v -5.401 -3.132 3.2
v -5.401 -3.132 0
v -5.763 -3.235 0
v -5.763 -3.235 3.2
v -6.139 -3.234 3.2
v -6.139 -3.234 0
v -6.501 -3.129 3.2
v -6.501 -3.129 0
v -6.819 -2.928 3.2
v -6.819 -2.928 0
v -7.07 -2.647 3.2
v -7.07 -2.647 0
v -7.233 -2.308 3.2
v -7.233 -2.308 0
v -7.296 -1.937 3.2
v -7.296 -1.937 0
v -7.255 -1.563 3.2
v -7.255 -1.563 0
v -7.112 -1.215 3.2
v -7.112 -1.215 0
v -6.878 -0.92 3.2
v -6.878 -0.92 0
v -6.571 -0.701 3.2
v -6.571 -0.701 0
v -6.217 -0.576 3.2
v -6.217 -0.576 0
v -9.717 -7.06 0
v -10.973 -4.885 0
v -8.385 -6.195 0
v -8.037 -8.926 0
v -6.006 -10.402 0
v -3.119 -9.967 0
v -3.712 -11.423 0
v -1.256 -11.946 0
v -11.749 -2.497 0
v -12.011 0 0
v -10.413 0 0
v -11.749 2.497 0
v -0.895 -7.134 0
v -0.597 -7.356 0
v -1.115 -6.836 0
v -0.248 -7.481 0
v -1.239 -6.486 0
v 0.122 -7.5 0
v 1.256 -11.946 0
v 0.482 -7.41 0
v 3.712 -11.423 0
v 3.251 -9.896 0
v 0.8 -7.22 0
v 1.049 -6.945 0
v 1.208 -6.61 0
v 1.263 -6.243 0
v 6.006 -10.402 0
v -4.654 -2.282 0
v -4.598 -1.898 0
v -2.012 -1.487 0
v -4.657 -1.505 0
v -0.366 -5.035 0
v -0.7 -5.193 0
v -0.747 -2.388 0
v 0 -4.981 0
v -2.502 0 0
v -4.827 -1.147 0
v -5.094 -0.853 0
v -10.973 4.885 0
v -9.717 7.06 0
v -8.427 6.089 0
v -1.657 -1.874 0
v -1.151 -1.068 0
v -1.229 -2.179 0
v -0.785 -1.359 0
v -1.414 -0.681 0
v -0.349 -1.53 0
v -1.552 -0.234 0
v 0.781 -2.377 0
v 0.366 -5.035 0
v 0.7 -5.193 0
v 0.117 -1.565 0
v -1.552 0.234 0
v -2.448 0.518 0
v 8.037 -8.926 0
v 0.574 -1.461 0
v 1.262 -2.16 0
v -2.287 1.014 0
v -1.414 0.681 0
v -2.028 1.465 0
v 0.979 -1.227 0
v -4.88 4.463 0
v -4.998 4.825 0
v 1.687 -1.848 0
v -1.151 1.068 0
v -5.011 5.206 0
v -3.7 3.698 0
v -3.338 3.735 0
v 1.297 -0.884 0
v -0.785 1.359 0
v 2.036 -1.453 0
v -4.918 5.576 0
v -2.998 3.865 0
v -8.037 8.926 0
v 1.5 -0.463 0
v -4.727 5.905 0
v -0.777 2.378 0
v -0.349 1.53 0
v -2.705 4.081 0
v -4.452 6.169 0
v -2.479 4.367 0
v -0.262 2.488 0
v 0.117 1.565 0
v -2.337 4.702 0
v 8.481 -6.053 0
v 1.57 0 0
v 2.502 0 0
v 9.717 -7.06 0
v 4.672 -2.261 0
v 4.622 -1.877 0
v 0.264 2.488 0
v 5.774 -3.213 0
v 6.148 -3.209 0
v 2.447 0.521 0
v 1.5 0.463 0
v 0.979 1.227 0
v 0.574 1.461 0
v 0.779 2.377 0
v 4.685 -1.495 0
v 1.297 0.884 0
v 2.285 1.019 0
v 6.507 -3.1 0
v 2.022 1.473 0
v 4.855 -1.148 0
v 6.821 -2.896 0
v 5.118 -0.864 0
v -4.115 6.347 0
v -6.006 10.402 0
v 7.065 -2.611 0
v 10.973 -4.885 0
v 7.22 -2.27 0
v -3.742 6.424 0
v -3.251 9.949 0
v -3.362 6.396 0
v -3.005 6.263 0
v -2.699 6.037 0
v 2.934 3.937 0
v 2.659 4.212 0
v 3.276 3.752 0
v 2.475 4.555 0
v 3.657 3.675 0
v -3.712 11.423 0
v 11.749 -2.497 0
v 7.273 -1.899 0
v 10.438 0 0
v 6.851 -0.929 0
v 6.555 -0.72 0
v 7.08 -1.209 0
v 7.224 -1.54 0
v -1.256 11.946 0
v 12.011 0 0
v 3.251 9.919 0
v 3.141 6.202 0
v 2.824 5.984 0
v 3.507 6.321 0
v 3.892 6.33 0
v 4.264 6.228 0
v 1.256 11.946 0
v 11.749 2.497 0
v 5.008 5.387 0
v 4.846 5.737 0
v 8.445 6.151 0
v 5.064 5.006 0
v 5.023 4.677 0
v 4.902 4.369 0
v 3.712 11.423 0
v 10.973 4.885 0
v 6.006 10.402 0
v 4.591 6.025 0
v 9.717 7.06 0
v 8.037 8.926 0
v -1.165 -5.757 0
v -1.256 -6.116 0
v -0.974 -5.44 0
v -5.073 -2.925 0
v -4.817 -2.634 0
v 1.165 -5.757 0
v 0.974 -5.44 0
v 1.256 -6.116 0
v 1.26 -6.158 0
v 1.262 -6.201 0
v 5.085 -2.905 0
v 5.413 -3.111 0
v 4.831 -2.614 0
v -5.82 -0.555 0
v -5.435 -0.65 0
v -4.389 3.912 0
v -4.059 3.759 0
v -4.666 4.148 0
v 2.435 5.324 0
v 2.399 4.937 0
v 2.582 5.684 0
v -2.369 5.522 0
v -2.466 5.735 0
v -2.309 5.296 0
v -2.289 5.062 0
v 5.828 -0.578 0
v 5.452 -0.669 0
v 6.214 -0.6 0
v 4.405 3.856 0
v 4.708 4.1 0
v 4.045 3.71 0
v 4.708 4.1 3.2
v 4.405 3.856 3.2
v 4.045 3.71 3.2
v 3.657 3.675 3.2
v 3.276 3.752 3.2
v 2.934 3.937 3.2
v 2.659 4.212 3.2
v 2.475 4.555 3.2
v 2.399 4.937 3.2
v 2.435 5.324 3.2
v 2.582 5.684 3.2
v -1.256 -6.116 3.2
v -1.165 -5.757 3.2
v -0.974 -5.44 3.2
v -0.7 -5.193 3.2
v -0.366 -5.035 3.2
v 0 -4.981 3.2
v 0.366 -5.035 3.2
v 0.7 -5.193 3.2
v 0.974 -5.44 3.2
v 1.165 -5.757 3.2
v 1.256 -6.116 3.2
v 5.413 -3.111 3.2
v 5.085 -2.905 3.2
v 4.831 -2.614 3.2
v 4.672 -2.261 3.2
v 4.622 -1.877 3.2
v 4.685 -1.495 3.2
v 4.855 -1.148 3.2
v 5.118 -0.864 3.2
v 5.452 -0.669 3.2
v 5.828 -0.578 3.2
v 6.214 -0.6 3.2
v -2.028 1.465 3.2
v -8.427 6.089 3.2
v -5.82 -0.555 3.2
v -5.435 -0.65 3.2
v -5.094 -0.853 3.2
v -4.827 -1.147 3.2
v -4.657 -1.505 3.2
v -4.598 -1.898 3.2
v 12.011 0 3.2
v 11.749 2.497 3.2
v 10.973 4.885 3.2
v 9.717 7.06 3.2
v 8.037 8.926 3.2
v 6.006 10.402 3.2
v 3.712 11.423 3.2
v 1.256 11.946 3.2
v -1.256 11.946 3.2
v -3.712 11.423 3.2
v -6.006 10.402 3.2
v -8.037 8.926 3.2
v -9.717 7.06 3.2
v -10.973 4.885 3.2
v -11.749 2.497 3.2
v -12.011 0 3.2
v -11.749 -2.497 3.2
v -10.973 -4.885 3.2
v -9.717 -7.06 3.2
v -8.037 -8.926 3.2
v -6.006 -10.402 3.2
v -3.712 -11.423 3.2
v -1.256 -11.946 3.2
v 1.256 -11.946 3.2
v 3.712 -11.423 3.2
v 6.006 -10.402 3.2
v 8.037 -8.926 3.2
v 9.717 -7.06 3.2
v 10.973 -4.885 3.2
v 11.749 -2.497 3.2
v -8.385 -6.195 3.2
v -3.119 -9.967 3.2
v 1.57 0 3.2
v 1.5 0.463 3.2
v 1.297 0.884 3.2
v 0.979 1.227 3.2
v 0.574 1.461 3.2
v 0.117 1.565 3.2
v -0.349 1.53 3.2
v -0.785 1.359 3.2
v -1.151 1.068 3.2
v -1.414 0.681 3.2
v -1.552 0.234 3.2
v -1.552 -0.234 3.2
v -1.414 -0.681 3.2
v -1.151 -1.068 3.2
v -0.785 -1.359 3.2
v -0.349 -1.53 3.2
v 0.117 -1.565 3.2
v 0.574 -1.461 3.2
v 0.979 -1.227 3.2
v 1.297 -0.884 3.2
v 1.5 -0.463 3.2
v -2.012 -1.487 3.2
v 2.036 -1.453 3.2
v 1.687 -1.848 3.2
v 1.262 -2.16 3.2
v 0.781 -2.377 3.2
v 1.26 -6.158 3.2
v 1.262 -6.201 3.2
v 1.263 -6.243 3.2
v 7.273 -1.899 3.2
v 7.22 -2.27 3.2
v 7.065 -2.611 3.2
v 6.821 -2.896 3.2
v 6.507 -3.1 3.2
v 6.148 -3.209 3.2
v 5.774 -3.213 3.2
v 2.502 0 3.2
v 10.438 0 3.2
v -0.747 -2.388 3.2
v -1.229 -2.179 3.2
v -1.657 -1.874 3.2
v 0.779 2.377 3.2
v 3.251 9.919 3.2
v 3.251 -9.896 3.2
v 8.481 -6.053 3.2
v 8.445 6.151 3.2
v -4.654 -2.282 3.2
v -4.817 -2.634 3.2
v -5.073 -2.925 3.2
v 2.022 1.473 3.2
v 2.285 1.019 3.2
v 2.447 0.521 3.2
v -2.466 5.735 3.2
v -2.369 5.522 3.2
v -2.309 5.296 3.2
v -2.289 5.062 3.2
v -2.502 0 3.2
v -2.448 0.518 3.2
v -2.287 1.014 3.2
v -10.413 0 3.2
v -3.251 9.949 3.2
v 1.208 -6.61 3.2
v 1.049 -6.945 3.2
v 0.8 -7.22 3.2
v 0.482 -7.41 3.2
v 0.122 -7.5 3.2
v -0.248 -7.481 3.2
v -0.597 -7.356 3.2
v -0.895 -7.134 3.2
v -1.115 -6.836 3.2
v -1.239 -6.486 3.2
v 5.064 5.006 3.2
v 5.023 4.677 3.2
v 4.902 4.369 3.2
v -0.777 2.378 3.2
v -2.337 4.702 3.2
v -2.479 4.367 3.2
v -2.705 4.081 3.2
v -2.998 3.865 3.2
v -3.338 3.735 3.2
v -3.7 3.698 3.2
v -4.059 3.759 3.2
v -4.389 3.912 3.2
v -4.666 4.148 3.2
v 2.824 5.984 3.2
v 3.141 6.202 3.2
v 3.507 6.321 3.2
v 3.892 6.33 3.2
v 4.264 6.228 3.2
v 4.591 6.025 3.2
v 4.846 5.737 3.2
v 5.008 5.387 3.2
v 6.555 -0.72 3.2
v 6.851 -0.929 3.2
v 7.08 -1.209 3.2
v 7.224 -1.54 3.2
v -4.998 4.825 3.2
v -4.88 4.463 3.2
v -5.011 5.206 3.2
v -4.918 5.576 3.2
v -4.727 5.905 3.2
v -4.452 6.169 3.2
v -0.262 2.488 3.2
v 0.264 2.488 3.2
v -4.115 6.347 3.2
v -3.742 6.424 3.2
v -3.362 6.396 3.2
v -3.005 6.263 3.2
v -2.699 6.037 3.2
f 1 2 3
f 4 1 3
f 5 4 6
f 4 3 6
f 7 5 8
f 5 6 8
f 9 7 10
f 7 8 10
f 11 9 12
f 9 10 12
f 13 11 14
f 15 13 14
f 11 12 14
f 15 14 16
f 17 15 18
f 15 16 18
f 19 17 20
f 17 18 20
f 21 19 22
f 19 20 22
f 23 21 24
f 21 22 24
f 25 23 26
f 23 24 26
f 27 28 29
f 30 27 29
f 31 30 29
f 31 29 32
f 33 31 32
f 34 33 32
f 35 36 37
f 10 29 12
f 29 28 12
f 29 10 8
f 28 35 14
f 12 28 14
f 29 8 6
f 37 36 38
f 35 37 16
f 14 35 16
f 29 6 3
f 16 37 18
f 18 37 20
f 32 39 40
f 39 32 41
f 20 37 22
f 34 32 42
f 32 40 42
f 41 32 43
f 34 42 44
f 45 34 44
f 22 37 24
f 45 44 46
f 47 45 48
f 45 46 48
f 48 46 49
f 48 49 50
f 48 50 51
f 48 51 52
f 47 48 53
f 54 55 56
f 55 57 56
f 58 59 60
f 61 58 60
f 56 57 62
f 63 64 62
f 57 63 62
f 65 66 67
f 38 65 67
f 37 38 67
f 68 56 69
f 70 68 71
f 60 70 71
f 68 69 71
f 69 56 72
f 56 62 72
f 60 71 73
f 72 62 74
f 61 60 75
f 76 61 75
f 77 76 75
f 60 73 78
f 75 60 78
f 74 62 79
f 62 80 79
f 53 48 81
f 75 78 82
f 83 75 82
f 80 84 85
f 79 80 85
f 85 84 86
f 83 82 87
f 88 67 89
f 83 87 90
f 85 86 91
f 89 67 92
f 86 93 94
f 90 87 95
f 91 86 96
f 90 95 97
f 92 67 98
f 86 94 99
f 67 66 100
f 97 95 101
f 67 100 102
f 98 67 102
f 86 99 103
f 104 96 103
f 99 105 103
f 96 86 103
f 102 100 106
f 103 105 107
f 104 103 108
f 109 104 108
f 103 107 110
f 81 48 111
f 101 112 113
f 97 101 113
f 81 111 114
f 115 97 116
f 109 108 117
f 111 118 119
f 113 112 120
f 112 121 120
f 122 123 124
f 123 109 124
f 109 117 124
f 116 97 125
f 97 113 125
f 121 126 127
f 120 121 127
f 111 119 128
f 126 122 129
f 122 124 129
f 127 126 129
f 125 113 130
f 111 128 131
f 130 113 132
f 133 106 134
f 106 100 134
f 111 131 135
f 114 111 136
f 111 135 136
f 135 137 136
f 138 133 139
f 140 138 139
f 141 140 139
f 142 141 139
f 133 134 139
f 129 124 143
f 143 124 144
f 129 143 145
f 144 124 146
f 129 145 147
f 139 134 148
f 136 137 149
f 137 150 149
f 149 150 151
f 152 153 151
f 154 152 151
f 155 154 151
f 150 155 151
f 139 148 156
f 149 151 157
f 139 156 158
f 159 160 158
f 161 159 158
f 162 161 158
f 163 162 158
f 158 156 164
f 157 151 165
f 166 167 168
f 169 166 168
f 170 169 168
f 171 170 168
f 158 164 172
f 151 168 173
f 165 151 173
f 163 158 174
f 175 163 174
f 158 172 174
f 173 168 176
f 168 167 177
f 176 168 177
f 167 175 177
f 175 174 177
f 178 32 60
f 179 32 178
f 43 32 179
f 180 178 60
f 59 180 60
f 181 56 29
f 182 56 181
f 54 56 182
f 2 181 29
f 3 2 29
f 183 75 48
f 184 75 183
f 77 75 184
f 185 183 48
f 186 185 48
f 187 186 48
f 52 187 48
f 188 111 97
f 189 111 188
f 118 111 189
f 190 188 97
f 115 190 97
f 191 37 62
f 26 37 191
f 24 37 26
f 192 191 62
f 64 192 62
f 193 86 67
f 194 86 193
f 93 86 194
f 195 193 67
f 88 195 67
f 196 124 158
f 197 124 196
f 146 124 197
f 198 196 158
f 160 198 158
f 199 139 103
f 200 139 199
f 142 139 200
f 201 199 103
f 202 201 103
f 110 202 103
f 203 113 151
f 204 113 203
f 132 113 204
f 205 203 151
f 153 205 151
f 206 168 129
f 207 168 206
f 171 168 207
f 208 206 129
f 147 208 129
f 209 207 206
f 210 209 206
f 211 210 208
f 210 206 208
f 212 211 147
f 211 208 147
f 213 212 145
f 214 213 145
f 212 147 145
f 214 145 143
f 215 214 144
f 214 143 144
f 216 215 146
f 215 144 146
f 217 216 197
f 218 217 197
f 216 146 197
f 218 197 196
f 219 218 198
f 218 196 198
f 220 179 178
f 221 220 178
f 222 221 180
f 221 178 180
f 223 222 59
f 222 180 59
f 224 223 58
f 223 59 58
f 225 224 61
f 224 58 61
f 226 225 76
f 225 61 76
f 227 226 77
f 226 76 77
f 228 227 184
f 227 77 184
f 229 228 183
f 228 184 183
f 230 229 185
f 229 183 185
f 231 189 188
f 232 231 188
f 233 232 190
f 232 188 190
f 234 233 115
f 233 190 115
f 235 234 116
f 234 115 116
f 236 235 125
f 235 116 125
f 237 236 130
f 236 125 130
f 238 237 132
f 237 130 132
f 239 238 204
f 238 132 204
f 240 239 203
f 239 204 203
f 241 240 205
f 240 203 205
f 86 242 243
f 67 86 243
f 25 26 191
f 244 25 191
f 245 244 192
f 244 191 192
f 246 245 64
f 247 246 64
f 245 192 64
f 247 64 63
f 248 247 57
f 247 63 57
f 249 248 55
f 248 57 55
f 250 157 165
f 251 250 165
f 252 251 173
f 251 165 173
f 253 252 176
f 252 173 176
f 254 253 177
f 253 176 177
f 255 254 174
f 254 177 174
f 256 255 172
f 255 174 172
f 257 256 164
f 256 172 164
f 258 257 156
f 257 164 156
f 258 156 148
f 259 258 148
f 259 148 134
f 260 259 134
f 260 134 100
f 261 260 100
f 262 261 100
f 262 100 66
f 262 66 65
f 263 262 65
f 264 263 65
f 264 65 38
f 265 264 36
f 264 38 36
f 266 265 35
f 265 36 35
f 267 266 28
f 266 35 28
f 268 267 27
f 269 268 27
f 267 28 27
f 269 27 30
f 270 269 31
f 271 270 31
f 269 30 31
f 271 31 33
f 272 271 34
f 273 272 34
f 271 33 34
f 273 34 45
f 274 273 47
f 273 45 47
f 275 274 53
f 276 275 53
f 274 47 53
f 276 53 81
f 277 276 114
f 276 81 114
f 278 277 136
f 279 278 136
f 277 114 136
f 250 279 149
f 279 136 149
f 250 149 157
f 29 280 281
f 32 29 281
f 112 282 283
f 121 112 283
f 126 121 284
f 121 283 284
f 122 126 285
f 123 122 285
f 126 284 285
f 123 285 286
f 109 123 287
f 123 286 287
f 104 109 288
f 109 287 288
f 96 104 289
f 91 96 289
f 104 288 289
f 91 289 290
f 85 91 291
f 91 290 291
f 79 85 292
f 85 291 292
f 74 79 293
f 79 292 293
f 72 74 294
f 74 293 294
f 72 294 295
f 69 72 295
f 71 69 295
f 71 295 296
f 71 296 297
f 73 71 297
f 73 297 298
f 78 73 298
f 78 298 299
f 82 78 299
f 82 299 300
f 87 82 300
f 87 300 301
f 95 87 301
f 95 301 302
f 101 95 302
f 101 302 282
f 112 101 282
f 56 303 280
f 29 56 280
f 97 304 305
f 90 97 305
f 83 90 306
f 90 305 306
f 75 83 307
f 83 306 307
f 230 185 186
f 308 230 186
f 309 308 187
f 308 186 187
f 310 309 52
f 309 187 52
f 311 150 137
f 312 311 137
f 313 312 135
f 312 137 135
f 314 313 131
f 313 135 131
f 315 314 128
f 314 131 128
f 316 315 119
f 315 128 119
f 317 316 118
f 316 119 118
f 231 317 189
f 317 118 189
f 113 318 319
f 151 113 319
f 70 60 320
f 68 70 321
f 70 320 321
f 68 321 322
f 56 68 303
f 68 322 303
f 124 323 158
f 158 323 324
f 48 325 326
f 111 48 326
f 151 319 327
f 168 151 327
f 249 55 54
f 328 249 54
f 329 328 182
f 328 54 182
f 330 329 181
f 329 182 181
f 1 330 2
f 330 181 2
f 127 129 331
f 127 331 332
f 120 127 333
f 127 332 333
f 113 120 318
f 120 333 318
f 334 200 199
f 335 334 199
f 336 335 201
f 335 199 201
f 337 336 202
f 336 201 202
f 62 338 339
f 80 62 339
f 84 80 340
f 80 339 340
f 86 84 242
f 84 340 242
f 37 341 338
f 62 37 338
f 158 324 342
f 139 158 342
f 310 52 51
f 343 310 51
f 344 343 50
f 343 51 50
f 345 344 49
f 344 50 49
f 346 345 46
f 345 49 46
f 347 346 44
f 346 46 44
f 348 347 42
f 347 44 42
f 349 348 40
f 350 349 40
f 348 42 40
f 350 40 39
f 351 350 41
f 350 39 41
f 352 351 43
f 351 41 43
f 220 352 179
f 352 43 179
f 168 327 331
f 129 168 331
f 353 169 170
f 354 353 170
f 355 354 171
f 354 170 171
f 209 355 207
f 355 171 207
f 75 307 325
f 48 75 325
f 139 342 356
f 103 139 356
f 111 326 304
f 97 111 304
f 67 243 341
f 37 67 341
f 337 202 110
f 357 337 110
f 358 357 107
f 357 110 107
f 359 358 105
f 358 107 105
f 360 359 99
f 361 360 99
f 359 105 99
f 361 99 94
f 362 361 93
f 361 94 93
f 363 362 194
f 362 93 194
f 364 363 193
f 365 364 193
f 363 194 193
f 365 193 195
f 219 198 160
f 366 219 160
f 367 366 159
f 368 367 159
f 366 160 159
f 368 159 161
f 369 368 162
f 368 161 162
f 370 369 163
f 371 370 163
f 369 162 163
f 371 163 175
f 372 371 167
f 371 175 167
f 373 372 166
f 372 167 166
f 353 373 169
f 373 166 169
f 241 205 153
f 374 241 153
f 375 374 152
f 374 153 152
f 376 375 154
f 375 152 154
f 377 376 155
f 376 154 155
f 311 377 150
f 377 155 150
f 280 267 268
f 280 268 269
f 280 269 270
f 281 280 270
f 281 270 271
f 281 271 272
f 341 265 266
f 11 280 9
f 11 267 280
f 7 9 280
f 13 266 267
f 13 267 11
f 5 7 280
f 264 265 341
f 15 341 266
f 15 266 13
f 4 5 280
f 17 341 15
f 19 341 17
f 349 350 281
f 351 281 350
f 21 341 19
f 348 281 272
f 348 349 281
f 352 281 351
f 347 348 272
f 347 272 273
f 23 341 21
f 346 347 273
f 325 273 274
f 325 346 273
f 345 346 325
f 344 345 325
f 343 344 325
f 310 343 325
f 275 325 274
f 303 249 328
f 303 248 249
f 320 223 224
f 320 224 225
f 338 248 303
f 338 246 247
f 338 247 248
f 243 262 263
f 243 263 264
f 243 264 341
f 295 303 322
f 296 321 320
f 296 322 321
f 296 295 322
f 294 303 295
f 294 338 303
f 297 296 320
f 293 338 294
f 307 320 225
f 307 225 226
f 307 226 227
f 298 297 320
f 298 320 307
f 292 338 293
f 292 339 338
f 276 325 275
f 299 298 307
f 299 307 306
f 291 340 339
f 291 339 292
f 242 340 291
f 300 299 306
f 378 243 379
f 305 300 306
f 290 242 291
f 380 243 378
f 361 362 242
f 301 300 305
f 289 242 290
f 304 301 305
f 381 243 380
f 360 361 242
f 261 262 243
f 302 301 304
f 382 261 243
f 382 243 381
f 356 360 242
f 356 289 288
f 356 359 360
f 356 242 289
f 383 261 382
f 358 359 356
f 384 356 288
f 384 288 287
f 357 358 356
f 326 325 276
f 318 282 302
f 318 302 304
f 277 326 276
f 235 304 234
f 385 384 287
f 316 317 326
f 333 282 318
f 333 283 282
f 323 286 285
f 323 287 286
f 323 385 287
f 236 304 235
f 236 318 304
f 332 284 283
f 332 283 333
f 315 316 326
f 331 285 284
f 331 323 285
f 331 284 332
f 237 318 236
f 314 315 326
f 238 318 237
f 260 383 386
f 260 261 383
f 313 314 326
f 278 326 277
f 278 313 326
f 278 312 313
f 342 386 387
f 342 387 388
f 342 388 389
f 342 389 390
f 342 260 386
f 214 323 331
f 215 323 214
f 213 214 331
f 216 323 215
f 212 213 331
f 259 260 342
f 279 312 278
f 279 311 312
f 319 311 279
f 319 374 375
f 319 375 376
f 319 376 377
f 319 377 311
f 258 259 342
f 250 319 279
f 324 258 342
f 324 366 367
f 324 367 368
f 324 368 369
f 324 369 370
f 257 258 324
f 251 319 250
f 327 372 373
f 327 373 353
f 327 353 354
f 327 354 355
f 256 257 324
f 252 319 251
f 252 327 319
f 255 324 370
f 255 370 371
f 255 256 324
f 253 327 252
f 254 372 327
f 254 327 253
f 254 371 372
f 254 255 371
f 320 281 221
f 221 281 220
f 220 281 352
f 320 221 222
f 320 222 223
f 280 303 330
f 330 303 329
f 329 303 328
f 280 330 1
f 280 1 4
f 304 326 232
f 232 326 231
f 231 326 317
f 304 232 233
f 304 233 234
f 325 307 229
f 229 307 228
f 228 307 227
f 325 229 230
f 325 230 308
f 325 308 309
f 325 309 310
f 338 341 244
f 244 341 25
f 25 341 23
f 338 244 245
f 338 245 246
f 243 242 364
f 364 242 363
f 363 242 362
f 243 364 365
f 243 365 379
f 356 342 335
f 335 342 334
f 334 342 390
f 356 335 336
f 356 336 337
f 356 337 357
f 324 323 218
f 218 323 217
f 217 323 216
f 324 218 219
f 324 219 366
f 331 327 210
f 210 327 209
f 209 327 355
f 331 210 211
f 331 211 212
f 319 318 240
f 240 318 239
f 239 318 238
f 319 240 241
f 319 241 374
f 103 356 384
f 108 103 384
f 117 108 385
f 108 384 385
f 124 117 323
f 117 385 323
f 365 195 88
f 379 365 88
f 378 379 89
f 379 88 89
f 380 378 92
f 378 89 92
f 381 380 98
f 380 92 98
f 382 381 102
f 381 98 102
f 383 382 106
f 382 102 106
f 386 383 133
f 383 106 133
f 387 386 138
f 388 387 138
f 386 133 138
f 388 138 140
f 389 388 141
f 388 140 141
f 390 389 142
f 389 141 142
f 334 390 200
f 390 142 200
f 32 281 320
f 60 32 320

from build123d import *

# Parameters (mm, degrees)
F0_R      = 12.0113110687
F1_DEPTH  = 3.2
F2_R      = 1.5698041018
F3_DEPTH  = 25
F8_DEPTH  = 25
F11_DEPTH = 25


with BuildPart() as f1:
    # F0 (on Top) → F1 (new body)
    with BuildSketch(Plane.XY):
        Circle(F0_R)
    extrude(amount=F1_DEPTH)

    # F2 (on face) → F3 (cut)
    with BuildSketch(Plane.XY.offset(3.2)):
        Circle(F2_R)
    extrude(amount=-F3_DEPTH, mode=Mode.SUBTRACT)

    # F6 (on face) → F8 (cut)
    with BuildSketch(Plane.XY.offset(3.2)):
        with BuildLine():
            ThreePointArc((-0.7770120639, 2.3781697719), (0.0011061793, 2.5018868855), (0.7791147181, 2.3774817491))
            Line((0.7791147181, 2.3774817491), (3.2505495474, 9.9191069603))
            Line((3.2505495474, 9.9191069603), (-3.25061474, 9.9490266293))
            Line((-3.25061474, 9.9490266293), (-0.7770120639, 2.3781697719))
        make_face()
        with BuildLine():
            ThreePointArc((2.0223107656, 1.4729896057), (2.3789737797, 0.774546943), (2.50188713, 0))
            Line((2.50188713, 0), (10.4379784316, 0))
            Line((10.4379784316, 0), (8.4454240277, 6.1513897963))
            Line((8.4454240277, 6.1513897963), (2.0223107656, 1.4729896057))
        make_face()
        with BuildLine():
            ThreePointArc((2.0364204787, -1.4534203952), (1.4823509758, -2.0154589542), (0.7807718841, -2.3769380464))
            Line((0.7807718841, -2.3769380464), (3.2505495474, -9.8957903683))
            Line((3.2505495474, -9.8957903683), (8.4810052067, -6.0530062765))
            Line((8.4810052067, -6.0530062765), (2.0364204787, -1.4534203952))
        make_face()
        with BuildLine():
            Line((-3.1185087282, -9.9669527262), (-0.7470875355, -2.3877393965))
            ThreePointArc((-0.7470875355, -2.3877393965), (-1.4513145315, -2.0379218194), (-2.0121805403, -1.4867981317))
            Line((-2.0121805403, -1.4867981317), (-8.3845453337, -6.1953319237))
            Line((-8.3845453337, -6.1953319237), (-3.1185087282, -9.9669527262))
        make_face()
        with BuildLine():
            Line((-10.4126818478, 0), (-2.50188713, 0))
            ThreePointArc((-2.50188713, 0), (-2.3804302696, 0.7700590516), (-2.0278522018, 1.4653513773))
            Line((-2.0278522018, 1.4653513773), (-8.4268115461, 6.089319475))
            Line((-8.4268115461, 6.089319475), (-10.4126818478, 0))
        make_face()
    extrude(amount=-F8_DEPTH, mode=Mode.SUBTRACT)

    # F10 (on face) → F11 (cut)
    with BuildSketch(Plane(origin=(0, 0, 0), x_dir=(1, 0, 0), z_dir=(0, 0, -1))):
        with BuildLine():
            ThreePointArc((-6.2165933365, 0.5757423441), (-5.9476825457, 1.8980474954), (-5.4009304255, 3.1316868454))
            ThreePointArc((-5.4009304255, 3.1316868454), (-7.2331832359, 2.3082814558), (-6.2165933365, 0.5757423441))
        make_face()
        with BuildLine():
            ThreePointArc((-4.5983108671, 1.8980474954), (-4.8166264567, 2.6339252369), (-5.4009304255, 3.1316868454))
            ThreePointArc((-5.4009304255, 3.1316868454), (-5.9476825457, 1.8980474954), (-6.2165933365, 0.5757423441))
            ThreePointArc((-6.2165933365, 0.5757423441), (-5.0938841732, 0.8531397167), (-4.5983108671, 1.8980474954))
        make_face()
        with BuildLine():
            ThreePointArc((-1.2560993846, 6.1155315627), (0, 6.2431972545), (1.2560993846, 6.1155315627))
            ThreePointArc((1.2560993846, 6.1155315627), (1.2609516612, 6.17928246), (1.2625704704, 6.2431972545))
            ThreePointArc((1.2625704704, 6.2431972545), (-0.0639147945, 7.5041489157), (-1.2560993846, 6.1155315627))
        make_face()
        with BuildLine():
            ThreePointArc((-1.2560993846, 6.1155315627), (0, 4.9806267841), (1.2560993846, 6.1155315627))
            ThreePointArc((1.2560993846, 6.1155315627), (0, 6.2431972545), (-1.2560993846, 6.1155315627))
        make_face()
        with BuildLine():
            ThreePointArc((5.4126141971, 3.1114497445), (4.6846825015, 1.4954228894), (6.2142952239, 0.6000390224))
            ThreePointArc((6.2142952239, 0.6000390224), (5.9475248318, 1.8985416334), (5.4126141971, 3.1114497445))
        make_face()
        with BuildLine():
            ThreePointArc((5.4126141971, 3.1114497445), (5.9475248318, 1.8985416334), (6.2142952239, 0.6000390224))
            ThreePointArc((6.2142952239, 0.6000390224), (6.9748788004, 1.0607950749), (7.2731475055, 1.8985416334))
            ThreePointArc((7.2731475055, 1.8985416334), (6.6714674425, 3.0090291703), (5.4126141971, 3.1114497445))
        make_face()
        with BuildLine():
            ThreePointArc((5.0638266611, -5.0062423526), (4.971794998, -4.5194305693), (4.7084027941, -4.0998115917))
            ThreePointArc((4.7084027941, -4.0998115917), (3.730288121, -5.0062423526), (2.5819813441, -5.6842663816))
            ThreePointArc((2.5819813441, -5.6842663816), (4.0817235312, -6.2926397214), (5.0638266611, -5.0062423526))
        make_face()
        with BuildLine():
            ThreePointArc((2.5819813441, -5.6842663816), (3.730288121, -5.0062423526), (4.7084027941, -4.0998115917))
            ThreePointArc((4.7084027941, -4.0998115917), (2.9335035935, -3.9369157166), (2.5819813441, -5.6842663816))
        make_face()
        with BuildLine():
            ThreePointArc((-4.6663905471, -4.1475669037), (-3.6536564941, -5.0624407337), (-2.4663245936, -5.7353949261))
            ThreePointArc((-2.4663245936, -5.7353949261), (-2.3339839606, -5.4104188814), (-2.2888765166, -5.0624407337))
            ThreePointArc((-2.2888765166, -5.0624407337), (-3.1635211919, -3.7887092971), (-4.6663905471, -4.1475669037))
        make_face()
        with BuildLine():
            ThreePointArc((-4.6663905471, -4.1475669037), (-4.4523557862, -6.1691041097), (-2.4663245936, -5.7353949261))
            ThreePointArc((-2.4663245936, -5.7353949261), (-3.6536564941, -5.0624407337), (-4.6663905471, -4.1475669037))
        make_face()
    extrude(amount=-F11_DEPTH, mode=Mode.SUBTRACT)


solid = f1.part
